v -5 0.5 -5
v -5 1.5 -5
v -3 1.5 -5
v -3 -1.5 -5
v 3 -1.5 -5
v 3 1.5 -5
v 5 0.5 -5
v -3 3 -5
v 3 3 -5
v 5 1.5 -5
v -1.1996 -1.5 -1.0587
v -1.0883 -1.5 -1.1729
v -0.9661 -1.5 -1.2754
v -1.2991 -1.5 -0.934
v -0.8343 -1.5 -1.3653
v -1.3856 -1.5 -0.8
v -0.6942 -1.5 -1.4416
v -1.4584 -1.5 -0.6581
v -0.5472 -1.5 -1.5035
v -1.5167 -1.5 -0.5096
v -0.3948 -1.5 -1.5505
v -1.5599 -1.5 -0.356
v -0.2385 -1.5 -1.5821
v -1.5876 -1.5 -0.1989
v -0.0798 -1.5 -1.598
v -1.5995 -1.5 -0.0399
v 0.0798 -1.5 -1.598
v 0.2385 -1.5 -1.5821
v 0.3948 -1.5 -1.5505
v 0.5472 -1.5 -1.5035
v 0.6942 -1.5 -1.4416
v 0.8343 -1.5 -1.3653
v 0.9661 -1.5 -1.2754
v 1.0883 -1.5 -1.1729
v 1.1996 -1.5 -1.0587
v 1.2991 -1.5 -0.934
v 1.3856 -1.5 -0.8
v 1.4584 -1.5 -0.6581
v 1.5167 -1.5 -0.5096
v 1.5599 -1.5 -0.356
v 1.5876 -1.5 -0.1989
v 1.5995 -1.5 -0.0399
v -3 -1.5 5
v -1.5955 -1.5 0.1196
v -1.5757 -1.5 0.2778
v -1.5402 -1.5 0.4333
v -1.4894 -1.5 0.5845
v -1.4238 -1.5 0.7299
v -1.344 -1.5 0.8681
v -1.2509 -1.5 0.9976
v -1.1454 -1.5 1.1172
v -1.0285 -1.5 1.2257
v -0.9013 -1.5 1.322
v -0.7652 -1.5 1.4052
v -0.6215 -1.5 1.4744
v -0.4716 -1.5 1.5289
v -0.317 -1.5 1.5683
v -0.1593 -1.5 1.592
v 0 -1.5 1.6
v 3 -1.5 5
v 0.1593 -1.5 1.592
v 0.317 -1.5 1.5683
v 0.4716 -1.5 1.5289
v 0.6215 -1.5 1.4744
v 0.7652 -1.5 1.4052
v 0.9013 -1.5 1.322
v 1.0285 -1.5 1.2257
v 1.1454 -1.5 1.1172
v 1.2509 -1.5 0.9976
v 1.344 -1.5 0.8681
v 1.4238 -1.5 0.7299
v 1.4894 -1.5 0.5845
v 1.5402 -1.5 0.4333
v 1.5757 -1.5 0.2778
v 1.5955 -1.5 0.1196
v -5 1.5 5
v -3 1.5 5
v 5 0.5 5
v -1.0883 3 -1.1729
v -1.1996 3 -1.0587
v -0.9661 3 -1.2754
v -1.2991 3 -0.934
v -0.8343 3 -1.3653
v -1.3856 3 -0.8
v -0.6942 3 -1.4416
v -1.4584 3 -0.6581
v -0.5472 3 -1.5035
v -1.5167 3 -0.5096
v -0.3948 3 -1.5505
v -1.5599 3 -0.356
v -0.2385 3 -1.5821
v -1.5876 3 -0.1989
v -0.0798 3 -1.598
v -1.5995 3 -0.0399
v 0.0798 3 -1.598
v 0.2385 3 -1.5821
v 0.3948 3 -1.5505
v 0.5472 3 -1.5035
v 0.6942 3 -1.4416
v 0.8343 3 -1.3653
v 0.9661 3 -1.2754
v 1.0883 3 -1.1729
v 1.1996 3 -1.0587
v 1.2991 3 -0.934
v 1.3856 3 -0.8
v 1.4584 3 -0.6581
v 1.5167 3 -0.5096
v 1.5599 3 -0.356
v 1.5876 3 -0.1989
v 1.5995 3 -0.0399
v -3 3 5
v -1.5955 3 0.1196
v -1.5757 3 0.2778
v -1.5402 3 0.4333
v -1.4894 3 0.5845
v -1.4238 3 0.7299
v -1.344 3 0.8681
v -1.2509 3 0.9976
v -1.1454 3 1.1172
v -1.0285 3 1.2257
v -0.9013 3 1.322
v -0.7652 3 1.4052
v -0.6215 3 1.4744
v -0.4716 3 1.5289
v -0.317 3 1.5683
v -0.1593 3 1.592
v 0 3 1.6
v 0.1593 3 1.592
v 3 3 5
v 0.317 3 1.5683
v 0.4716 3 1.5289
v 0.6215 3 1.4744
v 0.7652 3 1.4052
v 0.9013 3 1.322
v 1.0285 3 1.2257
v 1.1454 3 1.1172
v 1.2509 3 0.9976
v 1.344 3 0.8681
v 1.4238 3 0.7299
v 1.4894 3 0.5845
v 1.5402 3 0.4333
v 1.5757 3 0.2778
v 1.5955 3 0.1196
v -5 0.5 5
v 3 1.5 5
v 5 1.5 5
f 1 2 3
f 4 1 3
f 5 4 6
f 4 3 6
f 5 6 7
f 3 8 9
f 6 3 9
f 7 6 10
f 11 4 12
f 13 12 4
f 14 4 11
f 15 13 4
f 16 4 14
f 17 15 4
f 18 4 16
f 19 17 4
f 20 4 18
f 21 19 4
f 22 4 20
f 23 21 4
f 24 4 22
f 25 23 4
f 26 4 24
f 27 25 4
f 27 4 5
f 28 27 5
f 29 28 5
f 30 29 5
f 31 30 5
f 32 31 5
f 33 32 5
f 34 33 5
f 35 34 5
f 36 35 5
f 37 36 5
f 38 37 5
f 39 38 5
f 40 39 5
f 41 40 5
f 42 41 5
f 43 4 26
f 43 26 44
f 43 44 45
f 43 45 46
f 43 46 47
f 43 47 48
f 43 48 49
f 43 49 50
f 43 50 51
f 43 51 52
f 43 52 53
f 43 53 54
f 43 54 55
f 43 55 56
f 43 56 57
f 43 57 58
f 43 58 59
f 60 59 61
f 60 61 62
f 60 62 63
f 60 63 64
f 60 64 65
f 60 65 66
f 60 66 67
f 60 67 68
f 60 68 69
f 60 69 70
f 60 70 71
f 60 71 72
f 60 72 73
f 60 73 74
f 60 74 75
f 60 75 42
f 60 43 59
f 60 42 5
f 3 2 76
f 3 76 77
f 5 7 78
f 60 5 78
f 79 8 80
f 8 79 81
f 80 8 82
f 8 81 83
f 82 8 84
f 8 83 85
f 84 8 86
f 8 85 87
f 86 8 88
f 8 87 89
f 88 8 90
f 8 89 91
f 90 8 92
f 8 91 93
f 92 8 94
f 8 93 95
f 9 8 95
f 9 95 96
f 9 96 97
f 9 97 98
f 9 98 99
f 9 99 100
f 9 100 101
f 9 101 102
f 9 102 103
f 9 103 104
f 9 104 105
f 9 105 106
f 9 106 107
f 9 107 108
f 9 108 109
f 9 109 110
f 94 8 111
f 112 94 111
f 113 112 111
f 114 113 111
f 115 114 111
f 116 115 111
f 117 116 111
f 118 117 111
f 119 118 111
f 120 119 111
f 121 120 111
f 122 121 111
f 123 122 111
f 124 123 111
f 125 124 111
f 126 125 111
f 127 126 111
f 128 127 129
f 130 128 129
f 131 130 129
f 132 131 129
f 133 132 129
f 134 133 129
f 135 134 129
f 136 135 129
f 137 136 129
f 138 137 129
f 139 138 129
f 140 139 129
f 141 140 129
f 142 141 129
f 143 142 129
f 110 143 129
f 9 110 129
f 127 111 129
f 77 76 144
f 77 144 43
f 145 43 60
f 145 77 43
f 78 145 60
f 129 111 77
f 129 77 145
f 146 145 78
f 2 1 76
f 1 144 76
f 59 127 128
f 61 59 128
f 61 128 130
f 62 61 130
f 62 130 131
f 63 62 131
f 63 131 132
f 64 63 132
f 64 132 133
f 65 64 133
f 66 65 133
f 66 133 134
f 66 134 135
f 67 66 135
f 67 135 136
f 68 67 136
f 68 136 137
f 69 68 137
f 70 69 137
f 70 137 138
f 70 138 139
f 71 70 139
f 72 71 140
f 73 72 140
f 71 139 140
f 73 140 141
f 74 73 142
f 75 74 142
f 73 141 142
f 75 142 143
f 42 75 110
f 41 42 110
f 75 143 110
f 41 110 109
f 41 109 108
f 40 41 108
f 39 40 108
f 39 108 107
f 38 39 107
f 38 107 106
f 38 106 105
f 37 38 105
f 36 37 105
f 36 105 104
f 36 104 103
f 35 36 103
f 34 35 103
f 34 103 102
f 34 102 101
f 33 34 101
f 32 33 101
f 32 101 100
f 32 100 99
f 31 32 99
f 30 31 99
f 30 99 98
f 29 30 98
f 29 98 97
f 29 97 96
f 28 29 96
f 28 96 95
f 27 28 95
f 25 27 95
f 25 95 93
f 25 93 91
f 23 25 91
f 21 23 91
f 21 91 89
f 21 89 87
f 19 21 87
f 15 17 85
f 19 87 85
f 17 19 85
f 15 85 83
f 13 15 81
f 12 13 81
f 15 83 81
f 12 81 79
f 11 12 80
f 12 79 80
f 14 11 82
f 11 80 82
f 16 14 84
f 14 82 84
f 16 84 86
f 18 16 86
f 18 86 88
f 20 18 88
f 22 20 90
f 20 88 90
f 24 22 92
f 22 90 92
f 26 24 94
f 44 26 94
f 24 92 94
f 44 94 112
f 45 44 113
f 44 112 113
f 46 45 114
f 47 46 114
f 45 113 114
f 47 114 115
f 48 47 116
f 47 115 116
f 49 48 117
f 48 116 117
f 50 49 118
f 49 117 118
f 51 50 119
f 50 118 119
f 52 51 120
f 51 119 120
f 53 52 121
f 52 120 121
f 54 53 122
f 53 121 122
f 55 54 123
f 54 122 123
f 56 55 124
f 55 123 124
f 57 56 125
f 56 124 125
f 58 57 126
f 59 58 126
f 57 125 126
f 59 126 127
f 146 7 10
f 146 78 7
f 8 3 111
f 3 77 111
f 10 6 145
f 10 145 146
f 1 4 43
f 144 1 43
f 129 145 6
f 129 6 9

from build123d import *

# Parameters (mm, degrees)
SKETCH_1_W          = 10
SKETCH_1_H          = 3
SKETCH_1_W_2        = 6
EXTRUDE_1_DEPTH     = 5
SKETCH_2_R          = 1.6
CUT_EXTRUDE_1_DEPTH = 10
CHAMFER_1_SIZE      = 2


with BuildPart() as part:
    # 草图1 → 凸台-拉伸1 (new, symmetric)
    with BuildSketch(Plane.XY):
        Rectangle(SKETCH_1_W, SKETCH_1_H)
        with Locations((0, 1.5)):
            Rectangle(SKETCH_1_W_2, SKETCH_1_H)
    extrude(amount=EXTRUDE_1_DEPTH, both=True)

    # 草图2 → 切除-拉伸1 (cut)
    with BuildSketch(Plane(origin=(0, 3, 0), x_dir=(1, 0, 0), z_dir=(0, 1, 0))):
        with Locations(Location((0, 0, 0), (0, 0, 270))):
            Circle(SKETCH_2_R)
    extrude(amount=-CUT_EXTRUDE_1_DEPTH, mode=Mode.SUBTRACT)

    # 倒角1
    chamfer_1_edges = [part.edges().sort_by_distance(p)[0] for p in [
        (5, -1.5, 0),
        (-5, -1.5, 0),
    ]]
    chamfer(chamfer_1_edges, length=CHAMFER_1_SIZE)


solid = part.part
